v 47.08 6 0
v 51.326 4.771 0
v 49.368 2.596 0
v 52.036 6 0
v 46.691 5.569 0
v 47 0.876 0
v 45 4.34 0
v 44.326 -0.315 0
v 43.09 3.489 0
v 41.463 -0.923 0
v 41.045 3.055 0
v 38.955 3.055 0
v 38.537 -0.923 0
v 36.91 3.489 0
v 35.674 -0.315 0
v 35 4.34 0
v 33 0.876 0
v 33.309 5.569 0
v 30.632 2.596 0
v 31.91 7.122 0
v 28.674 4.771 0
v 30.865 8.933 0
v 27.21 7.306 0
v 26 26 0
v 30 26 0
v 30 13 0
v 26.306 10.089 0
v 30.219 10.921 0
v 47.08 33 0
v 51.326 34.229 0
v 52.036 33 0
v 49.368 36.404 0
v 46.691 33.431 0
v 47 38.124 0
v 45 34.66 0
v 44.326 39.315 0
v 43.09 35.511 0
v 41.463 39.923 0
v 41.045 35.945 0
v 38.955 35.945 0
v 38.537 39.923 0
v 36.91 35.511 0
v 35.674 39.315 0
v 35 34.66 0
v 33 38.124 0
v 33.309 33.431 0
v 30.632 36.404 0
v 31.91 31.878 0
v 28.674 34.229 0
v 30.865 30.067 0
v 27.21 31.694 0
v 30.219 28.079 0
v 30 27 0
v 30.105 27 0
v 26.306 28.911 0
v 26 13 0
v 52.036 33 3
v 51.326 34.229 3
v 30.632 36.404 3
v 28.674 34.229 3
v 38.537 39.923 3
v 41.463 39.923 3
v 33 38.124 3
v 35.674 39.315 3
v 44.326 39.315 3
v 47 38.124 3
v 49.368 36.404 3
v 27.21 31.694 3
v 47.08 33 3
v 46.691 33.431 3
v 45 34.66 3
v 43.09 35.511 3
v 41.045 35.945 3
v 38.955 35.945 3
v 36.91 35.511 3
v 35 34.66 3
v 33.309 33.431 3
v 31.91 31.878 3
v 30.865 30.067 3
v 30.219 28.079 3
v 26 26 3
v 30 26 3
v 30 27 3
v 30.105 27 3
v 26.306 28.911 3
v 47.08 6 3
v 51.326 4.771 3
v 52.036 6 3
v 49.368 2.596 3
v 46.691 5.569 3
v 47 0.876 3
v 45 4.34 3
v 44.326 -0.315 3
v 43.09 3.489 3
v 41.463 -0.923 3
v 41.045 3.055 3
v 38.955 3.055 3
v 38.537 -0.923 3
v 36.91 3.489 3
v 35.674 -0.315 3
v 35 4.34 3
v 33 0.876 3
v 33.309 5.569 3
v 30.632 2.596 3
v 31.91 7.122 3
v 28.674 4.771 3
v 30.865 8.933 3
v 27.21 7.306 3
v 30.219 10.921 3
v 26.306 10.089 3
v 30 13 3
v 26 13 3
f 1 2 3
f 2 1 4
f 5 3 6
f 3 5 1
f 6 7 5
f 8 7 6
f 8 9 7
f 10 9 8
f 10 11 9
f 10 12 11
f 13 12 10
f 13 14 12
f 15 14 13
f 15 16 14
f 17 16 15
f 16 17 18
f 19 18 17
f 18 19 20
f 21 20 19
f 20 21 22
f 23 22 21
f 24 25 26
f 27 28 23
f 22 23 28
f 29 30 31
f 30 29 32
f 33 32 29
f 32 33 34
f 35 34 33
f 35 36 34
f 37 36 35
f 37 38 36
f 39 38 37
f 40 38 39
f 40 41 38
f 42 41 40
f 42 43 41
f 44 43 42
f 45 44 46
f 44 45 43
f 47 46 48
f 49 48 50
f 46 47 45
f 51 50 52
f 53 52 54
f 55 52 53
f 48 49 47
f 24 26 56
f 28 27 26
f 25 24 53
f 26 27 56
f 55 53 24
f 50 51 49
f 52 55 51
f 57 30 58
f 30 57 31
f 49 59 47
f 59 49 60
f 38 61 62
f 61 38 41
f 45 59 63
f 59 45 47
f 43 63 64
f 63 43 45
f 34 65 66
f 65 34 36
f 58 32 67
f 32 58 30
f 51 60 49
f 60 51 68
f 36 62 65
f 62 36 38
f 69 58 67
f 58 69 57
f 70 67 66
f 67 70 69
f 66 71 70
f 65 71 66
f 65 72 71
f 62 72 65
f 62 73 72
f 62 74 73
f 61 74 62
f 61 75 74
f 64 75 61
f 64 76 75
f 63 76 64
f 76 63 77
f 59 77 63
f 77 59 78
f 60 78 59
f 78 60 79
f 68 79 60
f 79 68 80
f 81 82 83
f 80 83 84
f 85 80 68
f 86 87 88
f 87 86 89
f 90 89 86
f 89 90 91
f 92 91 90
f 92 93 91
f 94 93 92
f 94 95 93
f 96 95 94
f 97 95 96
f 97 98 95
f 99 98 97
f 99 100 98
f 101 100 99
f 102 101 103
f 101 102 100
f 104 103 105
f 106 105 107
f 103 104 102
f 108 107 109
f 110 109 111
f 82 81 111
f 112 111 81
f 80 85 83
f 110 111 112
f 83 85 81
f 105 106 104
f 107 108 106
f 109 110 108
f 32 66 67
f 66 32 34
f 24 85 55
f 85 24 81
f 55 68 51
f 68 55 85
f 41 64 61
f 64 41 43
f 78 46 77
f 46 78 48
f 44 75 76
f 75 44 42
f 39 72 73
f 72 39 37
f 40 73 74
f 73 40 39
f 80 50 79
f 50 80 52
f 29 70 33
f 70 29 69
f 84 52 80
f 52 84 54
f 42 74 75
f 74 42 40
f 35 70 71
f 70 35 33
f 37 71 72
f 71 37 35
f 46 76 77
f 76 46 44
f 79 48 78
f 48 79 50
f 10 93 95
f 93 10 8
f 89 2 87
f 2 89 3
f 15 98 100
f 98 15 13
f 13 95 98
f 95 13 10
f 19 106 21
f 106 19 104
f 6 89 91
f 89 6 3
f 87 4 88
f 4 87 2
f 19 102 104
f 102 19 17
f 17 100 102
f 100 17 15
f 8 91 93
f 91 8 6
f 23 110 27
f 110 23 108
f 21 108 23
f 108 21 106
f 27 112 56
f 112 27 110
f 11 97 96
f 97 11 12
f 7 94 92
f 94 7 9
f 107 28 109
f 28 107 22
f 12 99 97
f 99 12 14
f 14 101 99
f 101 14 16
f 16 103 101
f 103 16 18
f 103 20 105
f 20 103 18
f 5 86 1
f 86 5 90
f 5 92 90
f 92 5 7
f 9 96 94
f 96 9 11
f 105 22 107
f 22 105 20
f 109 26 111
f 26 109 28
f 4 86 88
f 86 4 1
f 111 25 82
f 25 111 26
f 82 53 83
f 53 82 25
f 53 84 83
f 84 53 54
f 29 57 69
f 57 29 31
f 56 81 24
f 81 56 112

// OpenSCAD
union(){

translate([26,13,0]) cube([4,13,3]);
difference(){
union(){
	
  difference(){
  translate([40,26,0]) cylinder(3,14,14);
  translate([40,26,-1]) cylinder(5,10,10);
  translate([33,12,-1]) cube([20,20,5]);

}

difference(){
  translate([40,13,0]) cylinder(3,14,14);
  translate([40,13,-1]) cylinder(5,10,10);
  translate([32,15,-1]) cube([19,13,5]);
  translate([40,6,-1]) cube(20);
}
}
  translate([30,13,-1]) cube([5,14,5]);
  translate([42,13,-1]) cube(20);
}
}
